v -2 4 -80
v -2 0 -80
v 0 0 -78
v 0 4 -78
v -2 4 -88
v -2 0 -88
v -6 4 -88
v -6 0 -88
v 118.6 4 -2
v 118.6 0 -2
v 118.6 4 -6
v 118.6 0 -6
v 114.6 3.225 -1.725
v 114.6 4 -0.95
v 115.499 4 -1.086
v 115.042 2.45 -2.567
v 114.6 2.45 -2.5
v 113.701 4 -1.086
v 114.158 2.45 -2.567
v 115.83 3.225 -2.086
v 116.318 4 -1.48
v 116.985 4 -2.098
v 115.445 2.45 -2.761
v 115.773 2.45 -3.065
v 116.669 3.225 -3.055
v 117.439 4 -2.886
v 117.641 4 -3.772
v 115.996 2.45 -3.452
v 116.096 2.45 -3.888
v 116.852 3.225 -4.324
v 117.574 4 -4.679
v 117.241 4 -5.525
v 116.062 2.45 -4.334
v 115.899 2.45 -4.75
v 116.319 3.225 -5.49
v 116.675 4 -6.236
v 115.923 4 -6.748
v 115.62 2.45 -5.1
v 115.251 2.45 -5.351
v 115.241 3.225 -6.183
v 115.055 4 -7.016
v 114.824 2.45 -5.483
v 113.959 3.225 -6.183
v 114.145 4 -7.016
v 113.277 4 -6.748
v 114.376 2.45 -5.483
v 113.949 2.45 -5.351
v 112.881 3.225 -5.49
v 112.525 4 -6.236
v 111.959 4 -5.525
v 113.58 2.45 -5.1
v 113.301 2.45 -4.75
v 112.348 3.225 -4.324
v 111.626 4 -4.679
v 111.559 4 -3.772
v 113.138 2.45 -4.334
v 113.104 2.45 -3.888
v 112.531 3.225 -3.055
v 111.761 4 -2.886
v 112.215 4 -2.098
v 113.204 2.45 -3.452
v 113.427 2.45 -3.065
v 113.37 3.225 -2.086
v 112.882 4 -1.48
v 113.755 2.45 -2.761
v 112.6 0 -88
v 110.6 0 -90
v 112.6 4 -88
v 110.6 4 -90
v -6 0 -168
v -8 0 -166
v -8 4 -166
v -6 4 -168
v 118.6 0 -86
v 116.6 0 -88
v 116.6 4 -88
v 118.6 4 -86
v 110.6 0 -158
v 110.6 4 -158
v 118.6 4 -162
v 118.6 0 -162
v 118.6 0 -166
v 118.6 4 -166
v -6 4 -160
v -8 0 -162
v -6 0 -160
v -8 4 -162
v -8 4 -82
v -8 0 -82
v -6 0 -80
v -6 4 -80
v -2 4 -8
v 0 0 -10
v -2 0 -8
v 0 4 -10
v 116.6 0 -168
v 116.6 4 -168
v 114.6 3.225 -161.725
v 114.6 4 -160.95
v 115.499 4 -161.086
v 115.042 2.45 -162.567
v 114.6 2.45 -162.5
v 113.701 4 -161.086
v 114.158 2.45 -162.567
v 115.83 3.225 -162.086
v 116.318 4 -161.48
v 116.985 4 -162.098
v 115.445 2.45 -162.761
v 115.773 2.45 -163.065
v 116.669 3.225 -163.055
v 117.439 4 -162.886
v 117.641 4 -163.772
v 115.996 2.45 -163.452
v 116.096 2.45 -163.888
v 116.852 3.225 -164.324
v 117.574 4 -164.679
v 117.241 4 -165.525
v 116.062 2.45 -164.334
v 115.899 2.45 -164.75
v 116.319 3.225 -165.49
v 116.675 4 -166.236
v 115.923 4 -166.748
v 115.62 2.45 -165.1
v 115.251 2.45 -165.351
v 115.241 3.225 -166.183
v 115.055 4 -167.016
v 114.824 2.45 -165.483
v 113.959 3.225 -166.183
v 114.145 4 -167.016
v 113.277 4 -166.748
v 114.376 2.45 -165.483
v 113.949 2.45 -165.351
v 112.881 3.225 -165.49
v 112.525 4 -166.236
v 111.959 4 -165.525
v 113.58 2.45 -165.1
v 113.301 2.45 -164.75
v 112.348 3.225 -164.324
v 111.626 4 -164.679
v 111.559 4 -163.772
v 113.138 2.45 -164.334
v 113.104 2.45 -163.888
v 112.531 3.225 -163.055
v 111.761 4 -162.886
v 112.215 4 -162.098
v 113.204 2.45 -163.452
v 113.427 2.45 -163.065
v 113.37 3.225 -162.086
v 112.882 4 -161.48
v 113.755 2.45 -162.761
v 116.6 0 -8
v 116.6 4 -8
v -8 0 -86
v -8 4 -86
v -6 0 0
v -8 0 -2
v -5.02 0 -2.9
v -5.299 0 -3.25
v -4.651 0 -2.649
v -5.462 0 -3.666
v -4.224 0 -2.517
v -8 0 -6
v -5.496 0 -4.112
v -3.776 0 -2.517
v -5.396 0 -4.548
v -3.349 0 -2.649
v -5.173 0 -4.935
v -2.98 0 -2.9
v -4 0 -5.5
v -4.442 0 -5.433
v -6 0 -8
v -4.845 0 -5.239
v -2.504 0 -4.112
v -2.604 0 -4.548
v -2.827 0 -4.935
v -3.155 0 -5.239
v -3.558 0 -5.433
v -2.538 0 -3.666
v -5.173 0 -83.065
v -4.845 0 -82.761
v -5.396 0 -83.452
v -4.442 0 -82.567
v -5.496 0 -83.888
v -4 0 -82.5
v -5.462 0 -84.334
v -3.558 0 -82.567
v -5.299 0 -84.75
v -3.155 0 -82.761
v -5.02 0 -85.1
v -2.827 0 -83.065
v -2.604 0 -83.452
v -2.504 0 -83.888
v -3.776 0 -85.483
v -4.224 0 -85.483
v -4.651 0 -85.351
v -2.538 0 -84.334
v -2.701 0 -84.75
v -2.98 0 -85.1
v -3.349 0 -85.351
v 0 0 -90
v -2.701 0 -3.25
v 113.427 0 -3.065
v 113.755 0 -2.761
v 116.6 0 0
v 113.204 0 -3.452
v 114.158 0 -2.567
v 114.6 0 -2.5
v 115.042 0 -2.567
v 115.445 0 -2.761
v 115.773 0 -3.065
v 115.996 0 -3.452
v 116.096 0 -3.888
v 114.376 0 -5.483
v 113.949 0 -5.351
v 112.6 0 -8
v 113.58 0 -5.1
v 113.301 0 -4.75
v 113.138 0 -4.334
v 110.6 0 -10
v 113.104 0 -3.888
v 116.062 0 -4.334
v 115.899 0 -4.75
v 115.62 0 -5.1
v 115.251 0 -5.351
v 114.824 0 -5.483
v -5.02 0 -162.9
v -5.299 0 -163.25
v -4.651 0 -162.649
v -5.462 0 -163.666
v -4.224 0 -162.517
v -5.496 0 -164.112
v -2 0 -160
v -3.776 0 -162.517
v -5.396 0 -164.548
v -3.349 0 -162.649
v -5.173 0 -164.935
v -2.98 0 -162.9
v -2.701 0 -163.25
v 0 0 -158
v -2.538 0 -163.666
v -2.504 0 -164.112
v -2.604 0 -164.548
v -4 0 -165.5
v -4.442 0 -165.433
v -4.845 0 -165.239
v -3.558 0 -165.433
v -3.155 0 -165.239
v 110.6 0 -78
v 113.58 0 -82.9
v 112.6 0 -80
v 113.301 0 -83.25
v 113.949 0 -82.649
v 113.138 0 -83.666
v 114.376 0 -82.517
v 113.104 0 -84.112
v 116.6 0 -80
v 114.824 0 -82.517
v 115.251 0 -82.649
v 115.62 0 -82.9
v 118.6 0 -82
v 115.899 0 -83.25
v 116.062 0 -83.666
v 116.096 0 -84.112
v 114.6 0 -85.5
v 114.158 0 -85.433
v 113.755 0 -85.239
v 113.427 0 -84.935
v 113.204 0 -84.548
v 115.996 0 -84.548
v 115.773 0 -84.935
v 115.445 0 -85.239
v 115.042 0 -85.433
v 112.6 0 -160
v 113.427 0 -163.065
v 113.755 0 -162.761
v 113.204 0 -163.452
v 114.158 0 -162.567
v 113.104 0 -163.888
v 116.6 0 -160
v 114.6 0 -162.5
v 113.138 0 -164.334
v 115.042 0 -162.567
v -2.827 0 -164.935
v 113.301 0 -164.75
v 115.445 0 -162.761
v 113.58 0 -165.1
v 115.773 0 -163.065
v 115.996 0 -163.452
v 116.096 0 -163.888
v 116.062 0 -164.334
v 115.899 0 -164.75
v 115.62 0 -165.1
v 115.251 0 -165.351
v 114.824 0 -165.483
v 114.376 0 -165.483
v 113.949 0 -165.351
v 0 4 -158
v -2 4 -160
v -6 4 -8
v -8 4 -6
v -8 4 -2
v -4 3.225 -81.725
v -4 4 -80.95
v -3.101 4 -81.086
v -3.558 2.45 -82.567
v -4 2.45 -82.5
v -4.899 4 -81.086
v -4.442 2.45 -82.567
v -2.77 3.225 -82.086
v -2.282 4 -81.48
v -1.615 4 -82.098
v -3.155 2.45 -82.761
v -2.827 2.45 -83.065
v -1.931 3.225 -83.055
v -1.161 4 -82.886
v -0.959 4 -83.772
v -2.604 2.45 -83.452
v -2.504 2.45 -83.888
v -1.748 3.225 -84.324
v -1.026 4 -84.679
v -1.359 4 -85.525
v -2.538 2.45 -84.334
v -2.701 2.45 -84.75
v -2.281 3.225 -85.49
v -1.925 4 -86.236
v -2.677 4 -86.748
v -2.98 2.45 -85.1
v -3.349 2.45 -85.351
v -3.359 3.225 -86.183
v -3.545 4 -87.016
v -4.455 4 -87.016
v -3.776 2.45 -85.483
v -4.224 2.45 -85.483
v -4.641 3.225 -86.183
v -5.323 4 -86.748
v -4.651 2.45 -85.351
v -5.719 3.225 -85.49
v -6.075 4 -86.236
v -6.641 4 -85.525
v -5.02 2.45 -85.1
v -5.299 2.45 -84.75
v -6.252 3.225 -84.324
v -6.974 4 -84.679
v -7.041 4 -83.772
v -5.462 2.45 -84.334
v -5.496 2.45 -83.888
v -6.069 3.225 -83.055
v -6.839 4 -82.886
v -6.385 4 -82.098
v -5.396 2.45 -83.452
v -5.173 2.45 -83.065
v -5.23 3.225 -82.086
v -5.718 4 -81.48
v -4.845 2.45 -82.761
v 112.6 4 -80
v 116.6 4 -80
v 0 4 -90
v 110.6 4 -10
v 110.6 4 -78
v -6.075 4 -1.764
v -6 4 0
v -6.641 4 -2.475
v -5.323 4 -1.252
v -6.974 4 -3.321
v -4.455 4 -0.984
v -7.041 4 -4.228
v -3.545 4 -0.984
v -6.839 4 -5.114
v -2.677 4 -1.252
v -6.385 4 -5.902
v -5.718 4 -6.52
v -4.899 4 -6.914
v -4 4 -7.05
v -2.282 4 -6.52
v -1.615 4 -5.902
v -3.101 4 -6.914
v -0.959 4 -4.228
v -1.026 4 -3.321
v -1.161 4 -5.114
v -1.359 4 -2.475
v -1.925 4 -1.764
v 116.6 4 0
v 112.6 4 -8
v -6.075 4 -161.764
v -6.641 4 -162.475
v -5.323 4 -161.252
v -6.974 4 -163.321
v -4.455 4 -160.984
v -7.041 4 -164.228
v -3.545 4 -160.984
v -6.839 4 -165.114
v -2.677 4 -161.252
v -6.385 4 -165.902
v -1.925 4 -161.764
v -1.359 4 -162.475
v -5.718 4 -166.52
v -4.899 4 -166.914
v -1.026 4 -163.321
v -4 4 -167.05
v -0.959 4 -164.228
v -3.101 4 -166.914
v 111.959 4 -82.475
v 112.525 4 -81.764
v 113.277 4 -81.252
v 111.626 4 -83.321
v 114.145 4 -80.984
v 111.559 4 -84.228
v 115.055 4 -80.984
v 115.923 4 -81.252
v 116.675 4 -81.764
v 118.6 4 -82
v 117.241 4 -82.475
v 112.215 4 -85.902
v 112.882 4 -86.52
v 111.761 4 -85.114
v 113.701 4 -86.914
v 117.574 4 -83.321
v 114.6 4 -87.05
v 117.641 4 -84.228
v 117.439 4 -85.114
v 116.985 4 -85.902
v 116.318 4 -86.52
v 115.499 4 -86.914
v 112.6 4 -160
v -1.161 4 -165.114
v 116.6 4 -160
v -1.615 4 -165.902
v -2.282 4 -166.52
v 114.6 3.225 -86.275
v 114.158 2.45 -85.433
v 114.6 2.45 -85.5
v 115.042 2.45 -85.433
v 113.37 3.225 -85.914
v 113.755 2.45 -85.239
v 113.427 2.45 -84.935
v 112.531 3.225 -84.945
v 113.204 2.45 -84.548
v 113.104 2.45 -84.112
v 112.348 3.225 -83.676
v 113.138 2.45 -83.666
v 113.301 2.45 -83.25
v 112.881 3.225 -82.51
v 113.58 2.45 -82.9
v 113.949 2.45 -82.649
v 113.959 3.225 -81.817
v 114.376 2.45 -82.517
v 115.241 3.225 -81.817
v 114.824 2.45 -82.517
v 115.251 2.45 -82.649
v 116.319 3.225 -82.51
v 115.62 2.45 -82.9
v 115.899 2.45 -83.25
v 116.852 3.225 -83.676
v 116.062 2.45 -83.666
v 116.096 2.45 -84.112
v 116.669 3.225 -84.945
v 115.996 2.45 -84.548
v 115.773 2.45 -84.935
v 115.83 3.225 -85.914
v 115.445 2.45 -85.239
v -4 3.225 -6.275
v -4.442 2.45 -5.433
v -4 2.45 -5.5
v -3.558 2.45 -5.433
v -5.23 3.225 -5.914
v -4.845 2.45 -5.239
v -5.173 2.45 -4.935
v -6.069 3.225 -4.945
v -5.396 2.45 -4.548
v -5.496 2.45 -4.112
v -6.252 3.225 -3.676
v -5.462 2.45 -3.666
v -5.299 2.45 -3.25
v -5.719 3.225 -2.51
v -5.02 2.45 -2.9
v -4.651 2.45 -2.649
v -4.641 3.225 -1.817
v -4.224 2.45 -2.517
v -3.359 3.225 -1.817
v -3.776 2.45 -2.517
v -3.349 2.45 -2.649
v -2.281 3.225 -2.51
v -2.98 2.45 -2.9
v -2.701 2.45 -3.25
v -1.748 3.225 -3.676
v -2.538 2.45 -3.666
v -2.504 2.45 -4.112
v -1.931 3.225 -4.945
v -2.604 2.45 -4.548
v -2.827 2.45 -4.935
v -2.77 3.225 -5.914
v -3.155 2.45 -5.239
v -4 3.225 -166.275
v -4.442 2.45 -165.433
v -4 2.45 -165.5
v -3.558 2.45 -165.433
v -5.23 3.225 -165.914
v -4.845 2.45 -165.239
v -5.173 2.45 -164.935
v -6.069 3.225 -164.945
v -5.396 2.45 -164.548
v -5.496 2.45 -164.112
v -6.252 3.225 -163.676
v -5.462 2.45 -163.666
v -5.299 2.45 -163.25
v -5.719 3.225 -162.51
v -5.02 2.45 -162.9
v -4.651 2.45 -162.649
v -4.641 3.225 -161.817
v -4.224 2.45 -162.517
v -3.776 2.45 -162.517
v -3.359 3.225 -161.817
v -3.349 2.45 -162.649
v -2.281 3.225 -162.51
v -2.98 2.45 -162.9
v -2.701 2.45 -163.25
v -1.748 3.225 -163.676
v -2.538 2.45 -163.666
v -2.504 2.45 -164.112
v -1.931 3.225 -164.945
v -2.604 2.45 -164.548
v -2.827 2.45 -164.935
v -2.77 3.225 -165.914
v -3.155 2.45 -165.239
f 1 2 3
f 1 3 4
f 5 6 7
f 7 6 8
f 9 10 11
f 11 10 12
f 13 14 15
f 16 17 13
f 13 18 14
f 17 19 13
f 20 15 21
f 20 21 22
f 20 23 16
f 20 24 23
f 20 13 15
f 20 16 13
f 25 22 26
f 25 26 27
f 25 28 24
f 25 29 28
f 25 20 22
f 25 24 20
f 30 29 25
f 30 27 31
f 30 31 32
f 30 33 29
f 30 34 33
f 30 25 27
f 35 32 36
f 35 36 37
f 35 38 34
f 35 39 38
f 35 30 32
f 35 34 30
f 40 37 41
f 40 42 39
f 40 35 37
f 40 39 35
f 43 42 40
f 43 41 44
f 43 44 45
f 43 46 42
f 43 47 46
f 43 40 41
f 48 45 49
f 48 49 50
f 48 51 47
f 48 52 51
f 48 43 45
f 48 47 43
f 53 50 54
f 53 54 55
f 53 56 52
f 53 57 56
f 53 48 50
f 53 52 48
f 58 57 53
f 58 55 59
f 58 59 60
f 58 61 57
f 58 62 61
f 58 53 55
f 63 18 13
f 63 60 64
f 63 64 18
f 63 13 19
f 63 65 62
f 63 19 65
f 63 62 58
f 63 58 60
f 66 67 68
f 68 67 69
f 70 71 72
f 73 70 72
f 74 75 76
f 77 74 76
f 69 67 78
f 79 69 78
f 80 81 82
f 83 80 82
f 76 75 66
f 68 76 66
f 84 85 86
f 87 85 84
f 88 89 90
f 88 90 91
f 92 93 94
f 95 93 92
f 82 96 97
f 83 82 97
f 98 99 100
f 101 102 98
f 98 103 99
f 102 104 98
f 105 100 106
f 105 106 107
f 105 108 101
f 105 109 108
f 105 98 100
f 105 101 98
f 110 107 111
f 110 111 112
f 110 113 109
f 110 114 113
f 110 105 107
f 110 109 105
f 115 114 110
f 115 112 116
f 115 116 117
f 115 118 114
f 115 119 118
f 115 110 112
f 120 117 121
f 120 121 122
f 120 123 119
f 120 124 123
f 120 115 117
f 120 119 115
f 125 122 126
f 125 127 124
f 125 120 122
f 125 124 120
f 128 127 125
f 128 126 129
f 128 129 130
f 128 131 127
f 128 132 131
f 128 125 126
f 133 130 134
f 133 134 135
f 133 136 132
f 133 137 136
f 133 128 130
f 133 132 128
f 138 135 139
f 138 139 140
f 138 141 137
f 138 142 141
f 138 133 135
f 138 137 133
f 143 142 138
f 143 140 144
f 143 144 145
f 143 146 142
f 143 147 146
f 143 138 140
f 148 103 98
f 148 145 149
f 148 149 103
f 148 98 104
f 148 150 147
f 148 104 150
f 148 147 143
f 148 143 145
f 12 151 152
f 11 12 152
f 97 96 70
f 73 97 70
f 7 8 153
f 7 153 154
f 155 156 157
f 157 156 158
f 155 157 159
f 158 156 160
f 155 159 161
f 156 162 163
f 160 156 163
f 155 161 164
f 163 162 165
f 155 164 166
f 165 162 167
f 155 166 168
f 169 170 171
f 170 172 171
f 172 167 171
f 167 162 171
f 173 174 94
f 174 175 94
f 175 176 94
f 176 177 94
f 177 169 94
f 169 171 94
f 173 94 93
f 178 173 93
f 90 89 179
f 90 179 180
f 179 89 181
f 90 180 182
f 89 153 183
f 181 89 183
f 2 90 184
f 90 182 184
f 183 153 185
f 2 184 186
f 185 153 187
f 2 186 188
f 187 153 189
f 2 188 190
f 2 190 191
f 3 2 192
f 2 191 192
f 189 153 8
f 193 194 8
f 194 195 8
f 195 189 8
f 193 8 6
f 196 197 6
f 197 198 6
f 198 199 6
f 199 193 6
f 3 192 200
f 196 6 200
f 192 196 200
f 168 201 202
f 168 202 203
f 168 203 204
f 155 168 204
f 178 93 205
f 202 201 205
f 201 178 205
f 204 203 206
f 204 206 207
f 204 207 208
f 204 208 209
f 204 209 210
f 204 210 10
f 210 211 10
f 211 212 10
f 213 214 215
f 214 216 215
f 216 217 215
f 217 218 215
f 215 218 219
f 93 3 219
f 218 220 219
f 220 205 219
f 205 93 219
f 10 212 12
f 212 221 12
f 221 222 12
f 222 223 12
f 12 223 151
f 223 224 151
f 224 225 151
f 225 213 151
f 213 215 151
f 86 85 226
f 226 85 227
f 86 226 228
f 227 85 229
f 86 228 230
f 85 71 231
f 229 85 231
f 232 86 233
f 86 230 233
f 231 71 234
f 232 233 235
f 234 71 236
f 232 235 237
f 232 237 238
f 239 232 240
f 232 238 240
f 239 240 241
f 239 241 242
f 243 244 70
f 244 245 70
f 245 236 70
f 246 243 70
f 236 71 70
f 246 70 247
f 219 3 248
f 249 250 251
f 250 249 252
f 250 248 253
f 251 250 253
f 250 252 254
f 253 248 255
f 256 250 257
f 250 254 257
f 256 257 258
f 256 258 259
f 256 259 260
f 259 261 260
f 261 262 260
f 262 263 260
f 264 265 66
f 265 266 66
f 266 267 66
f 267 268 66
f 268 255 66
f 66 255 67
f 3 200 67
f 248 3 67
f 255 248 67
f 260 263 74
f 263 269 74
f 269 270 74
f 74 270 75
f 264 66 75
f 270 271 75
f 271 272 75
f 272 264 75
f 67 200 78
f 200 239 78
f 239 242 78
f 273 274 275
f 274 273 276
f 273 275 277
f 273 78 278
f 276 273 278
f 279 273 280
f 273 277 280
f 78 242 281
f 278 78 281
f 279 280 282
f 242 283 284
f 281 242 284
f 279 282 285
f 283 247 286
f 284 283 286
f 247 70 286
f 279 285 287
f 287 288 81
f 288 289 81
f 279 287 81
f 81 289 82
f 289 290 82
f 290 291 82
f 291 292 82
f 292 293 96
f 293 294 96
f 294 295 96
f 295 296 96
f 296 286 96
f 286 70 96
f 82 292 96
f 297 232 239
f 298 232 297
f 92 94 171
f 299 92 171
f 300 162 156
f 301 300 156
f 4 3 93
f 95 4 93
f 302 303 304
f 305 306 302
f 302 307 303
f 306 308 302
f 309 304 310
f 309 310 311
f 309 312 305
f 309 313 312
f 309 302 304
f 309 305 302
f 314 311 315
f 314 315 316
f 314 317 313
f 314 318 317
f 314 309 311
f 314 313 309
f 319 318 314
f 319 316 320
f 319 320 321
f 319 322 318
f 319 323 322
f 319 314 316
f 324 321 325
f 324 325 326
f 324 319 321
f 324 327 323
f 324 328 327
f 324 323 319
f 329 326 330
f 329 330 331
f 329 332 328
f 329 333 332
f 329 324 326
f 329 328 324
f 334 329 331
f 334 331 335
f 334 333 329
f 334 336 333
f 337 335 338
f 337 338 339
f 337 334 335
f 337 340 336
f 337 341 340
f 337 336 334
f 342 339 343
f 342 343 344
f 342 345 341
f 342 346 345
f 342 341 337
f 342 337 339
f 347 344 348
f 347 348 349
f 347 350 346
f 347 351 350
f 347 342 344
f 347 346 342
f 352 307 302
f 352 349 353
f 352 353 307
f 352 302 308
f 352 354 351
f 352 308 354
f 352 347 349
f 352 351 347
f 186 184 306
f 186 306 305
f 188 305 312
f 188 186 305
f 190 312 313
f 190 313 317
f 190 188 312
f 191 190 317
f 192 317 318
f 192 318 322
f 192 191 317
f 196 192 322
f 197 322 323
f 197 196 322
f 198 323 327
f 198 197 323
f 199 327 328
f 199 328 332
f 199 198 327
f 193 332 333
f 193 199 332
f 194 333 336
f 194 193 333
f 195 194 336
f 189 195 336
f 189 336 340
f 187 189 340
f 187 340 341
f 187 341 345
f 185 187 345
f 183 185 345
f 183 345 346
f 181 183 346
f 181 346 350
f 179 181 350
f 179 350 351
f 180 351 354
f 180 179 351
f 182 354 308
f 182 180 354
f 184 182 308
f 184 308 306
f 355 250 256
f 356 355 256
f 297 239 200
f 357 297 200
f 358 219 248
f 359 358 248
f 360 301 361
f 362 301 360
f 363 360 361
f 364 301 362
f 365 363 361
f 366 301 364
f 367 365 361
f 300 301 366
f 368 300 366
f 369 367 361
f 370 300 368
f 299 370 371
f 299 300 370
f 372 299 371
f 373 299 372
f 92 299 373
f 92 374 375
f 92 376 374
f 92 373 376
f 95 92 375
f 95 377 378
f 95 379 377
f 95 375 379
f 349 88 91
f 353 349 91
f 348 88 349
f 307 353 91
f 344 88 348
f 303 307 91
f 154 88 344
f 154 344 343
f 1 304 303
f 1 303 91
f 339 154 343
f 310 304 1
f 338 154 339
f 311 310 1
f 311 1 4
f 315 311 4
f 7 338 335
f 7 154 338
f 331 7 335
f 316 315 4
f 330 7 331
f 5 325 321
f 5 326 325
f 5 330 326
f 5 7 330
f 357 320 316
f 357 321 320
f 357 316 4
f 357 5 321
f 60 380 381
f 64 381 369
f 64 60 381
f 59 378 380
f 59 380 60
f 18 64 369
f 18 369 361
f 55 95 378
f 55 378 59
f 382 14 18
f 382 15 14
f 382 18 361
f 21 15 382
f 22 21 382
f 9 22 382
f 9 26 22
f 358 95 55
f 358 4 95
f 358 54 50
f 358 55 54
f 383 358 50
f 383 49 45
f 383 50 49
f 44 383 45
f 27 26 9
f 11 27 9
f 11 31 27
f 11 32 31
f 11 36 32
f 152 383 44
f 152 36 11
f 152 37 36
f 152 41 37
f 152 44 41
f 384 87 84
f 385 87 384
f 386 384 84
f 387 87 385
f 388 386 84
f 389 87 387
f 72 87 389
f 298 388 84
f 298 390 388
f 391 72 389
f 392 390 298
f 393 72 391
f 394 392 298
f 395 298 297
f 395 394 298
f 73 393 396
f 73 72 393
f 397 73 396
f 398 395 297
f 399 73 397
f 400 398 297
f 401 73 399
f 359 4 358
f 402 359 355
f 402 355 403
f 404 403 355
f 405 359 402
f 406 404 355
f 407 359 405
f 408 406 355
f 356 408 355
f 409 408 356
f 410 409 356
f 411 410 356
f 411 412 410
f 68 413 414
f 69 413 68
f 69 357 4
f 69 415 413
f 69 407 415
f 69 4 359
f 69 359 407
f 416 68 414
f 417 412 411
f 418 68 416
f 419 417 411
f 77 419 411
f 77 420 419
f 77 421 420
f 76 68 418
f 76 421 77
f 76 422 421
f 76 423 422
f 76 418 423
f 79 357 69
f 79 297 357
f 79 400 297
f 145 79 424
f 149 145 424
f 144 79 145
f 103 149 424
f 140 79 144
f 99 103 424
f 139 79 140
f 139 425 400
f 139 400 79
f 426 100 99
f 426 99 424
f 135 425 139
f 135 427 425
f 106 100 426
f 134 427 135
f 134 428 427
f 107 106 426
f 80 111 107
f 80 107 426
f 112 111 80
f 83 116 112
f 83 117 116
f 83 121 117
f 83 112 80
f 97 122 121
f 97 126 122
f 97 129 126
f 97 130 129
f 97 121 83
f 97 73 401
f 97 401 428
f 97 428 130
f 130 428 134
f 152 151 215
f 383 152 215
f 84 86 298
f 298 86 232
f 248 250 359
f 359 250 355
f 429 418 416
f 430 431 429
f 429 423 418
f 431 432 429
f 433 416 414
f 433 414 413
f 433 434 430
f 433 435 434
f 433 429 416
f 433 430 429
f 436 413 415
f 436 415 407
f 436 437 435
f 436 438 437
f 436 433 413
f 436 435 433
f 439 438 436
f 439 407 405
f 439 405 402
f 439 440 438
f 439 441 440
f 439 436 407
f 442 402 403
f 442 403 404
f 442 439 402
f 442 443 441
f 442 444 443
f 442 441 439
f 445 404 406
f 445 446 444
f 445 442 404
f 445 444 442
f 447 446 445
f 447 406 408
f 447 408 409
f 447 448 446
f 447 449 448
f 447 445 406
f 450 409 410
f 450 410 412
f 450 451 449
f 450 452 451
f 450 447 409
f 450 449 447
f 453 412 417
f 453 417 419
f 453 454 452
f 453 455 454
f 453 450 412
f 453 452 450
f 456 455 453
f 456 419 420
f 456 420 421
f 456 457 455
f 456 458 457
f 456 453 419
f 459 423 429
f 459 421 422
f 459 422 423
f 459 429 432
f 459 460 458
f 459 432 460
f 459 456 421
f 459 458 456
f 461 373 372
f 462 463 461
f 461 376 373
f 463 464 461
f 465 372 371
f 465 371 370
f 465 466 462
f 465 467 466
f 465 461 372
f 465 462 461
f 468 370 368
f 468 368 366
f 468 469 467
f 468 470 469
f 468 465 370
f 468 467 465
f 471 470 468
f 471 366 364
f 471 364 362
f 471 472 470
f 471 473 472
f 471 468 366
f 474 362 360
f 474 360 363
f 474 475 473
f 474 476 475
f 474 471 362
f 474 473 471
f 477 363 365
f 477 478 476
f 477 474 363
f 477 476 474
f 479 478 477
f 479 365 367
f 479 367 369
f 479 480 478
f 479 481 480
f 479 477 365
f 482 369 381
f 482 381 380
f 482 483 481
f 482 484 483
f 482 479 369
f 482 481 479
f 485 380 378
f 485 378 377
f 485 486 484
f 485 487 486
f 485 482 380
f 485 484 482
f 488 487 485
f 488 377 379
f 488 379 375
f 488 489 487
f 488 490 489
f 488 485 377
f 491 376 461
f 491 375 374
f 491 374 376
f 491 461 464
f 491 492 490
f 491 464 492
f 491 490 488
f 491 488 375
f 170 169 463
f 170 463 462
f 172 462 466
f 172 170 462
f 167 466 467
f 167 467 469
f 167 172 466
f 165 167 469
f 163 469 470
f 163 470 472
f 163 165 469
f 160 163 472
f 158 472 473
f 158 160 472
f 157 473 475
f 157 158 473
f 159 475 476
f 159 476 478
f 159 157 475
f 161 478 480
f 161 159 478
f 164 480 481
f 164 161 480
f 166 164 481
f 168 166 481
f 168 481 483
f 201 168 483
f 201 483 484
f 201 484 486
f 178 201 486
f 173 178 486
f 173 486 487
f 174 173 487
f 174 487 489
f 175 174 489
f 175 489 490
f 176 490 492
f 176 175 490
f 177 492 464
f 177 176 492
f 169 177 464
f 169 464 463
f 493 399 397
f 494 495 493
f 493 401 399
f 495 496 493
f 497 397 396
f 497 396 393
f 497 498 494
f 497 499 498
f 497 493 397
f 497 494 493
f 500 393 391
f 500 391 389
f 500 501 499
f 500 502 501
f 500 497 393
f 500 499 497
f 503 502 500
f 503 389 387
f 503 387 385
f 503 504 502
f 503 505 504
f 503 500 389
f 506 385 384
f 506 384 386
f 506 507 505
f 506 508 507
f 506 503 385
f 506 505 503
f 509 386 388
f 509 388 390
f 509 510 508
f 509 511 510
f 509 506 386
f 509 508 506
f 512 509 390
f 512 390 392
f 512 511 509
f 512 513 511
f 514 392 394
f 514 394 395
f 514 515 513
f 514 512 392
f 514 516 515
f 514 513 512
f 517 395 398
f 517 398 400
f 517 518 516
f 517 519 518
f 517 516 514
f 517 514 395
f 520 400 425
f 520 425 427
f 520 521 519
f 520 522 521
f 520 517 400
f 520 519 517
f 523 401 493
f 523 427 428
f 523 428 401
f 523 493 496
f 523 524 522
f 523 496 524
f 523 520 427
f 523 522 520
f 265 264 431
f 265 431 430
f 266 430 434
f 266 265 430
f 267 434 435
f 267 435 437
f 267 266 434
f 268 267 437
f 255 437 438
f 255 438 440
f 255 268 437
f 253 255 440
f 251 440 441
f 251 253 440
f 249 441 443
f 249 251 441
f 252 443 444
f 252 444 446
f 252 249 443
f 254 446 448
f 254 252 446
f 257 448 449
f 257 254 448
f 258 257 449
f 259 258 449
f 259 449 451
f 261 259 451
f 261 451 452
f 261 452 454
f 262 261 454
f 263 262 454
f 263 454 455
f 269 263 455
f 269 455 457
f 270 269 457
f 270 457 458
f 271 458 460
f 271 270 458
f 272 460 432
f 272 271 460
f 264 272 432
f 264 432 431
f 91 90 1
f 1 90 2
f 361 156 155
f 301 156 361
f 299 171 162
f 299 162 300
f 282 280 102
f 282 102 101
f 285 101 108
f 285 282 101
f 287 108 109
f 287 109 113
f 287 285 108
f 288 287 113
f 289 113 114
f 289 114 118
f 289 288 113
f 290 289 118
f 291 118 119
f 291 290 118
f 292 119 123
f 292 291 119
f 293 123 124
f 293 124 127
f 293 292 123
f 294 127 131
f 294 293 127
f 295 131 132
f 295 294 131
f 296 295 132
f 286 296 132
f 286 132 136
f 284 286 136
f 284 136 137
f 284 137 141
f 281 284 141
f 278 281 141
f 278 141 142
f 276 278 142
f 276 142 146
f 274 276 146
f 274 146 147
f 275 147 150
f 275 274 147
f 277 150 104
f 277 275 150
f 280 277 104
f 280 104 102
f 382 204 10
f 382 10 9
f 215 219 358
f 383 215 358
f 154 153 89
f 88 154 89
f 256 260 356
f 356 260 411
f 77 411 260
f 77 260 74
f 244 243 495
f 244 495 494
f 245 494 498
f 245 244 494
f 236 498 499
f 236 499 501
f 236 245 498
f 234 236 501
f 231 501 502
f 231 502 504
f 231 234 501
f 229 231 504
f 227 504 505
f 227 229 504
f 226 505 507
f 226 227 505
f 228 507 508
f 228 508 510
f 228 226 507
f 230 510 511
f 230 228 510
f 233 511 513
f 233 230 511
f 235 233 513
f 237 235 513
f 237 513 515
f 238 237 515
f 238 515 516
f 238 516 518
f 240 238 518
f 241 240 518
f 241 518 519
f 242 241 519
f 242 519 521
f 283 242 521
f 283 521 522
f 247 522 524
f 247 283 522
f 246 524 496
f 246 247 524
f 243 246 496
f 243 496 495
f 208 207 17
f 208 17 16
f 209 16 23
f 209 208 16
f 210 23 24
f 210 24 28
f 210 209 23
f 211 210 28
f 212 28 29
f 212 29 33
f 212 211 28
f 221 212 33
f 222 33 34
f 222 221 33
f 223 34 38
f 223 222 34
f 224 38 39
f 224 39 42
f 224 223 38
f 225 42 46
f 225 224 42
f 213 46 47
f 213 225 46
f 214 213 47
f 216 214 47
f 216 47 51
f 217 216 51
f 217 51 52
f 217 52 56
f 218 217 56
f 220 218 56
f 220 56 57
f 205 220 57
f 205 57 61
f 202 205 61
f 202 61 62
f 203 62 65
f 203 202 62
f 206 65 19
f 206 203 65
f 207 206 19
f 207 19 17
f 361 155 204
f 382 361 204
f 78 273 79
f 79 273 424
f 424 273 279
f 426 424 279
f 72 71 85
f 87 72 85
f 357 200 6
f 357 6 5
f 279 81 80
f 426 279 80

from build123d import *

# Parameters (mm, degrees)
SKETCH1_R           = 1.5
BOSS_EXTRUDE1_DEPTH = 4
CHAMFER1_SIZE       = 2
CHAMFER2_SIZE       = 1.55


with BuildPart() as part:
    # Sketch1 → Boss-Extrude1 (new body)
    with BuildSketch(Plane(origin=(0, 0, 0), x_dir=(1, 0, 0), z_dir=(0, 1, 0))):
        Polygon((0, 0), (110.6, 0), (118.6, 0), (118.6, 8), (110.6, 8), (110.6, 80), (118.6, 80), (118.6, 88), (110.6, 88), (110.6, 160), (118.6, 160), (118.6, 168), (110.6, 168), (0, 168), (-8, 168), (-8, 160), (0, 160), (0, 88), (-8, 88), (-8, 80), (0, 80), (0, 8), (-8, 8), (-8, 0), align=None)
        with Locations(Location((114.6, 164, 0), (0, 0, 270))):
            Circle(SKETCH1_R, mode=Mode.SUBTRACT)
        with Locations(Location((114.6, 84, 0), (0, 0, 90))):
            Circle(SKETCH1_R, mode=Mode.SUBTRACT)
        with Locations(Location((114.6, 4, 0), (0, 0, 270))):
            Circle(SKETCH1_R, mode=Mode.SUBTRACT)
        with Locations(Location((-4, 4, 0), (0, 0, 90))):
            Circle(SKETCH1_R, mode=Mode.SUBTRACT)
        with Locations(Location((-4, 84, 0), (0, 0, 270))):
            Circle(SKETCH1_R, mode=Mode.SUBTRACT)
        with Locations(Location((-4, 164, 0), (0, 0, 90))):
            Circle(SKETCH1_R, mode=Mode.SUBTRACT)
    extrude(amount=BOSS_EXTRUDE1_DEPTH)

    # Chamfer1
    chamfer1_edges = [part.edges().sort_by_distance(p)[0] for p in [
        (-8, 2, 0),
        (-8, 2, -8),
        (0, 2, -8),
        (0, 2, -80),
        (-8, 2, -80),
        (-8, 2, -88),
        (0, 2, -88),
        (0, 2, -160),
        (-8, 2, -160),
        (-8, 2, -168),
        (118.6, 2, -168),
        (118.6, 2, -160),
        (110.6, 2, -160),
        (110.6, 2, -88),
        (118.6, 2, -88),
        (118.6, 2, -80),
        (110.6, 2, -80),
        (110.6, 2, -8),
        (118.6, 2, -8),
        (118.6, 2, 0),
    ]]
    chamfer(chamfer1_edges, length=CHAMFER1_SIZE)

    # Chamfer2
    chamfer2_edges = [part.edges().sort_by_distance(p)[0] for p in [
        (114.6, 4, -165.5),
        (114.6, 4, -82.5),
        (114.6, 4, -5.5),
        (-4, 4, -2.5),
        (-4, 4, -85.5),
        (-4, 4, -162.5),
    ]]
    chamfer(chamfer2_edges, length=CHAMFER2_SIZE)


solid = part.part
